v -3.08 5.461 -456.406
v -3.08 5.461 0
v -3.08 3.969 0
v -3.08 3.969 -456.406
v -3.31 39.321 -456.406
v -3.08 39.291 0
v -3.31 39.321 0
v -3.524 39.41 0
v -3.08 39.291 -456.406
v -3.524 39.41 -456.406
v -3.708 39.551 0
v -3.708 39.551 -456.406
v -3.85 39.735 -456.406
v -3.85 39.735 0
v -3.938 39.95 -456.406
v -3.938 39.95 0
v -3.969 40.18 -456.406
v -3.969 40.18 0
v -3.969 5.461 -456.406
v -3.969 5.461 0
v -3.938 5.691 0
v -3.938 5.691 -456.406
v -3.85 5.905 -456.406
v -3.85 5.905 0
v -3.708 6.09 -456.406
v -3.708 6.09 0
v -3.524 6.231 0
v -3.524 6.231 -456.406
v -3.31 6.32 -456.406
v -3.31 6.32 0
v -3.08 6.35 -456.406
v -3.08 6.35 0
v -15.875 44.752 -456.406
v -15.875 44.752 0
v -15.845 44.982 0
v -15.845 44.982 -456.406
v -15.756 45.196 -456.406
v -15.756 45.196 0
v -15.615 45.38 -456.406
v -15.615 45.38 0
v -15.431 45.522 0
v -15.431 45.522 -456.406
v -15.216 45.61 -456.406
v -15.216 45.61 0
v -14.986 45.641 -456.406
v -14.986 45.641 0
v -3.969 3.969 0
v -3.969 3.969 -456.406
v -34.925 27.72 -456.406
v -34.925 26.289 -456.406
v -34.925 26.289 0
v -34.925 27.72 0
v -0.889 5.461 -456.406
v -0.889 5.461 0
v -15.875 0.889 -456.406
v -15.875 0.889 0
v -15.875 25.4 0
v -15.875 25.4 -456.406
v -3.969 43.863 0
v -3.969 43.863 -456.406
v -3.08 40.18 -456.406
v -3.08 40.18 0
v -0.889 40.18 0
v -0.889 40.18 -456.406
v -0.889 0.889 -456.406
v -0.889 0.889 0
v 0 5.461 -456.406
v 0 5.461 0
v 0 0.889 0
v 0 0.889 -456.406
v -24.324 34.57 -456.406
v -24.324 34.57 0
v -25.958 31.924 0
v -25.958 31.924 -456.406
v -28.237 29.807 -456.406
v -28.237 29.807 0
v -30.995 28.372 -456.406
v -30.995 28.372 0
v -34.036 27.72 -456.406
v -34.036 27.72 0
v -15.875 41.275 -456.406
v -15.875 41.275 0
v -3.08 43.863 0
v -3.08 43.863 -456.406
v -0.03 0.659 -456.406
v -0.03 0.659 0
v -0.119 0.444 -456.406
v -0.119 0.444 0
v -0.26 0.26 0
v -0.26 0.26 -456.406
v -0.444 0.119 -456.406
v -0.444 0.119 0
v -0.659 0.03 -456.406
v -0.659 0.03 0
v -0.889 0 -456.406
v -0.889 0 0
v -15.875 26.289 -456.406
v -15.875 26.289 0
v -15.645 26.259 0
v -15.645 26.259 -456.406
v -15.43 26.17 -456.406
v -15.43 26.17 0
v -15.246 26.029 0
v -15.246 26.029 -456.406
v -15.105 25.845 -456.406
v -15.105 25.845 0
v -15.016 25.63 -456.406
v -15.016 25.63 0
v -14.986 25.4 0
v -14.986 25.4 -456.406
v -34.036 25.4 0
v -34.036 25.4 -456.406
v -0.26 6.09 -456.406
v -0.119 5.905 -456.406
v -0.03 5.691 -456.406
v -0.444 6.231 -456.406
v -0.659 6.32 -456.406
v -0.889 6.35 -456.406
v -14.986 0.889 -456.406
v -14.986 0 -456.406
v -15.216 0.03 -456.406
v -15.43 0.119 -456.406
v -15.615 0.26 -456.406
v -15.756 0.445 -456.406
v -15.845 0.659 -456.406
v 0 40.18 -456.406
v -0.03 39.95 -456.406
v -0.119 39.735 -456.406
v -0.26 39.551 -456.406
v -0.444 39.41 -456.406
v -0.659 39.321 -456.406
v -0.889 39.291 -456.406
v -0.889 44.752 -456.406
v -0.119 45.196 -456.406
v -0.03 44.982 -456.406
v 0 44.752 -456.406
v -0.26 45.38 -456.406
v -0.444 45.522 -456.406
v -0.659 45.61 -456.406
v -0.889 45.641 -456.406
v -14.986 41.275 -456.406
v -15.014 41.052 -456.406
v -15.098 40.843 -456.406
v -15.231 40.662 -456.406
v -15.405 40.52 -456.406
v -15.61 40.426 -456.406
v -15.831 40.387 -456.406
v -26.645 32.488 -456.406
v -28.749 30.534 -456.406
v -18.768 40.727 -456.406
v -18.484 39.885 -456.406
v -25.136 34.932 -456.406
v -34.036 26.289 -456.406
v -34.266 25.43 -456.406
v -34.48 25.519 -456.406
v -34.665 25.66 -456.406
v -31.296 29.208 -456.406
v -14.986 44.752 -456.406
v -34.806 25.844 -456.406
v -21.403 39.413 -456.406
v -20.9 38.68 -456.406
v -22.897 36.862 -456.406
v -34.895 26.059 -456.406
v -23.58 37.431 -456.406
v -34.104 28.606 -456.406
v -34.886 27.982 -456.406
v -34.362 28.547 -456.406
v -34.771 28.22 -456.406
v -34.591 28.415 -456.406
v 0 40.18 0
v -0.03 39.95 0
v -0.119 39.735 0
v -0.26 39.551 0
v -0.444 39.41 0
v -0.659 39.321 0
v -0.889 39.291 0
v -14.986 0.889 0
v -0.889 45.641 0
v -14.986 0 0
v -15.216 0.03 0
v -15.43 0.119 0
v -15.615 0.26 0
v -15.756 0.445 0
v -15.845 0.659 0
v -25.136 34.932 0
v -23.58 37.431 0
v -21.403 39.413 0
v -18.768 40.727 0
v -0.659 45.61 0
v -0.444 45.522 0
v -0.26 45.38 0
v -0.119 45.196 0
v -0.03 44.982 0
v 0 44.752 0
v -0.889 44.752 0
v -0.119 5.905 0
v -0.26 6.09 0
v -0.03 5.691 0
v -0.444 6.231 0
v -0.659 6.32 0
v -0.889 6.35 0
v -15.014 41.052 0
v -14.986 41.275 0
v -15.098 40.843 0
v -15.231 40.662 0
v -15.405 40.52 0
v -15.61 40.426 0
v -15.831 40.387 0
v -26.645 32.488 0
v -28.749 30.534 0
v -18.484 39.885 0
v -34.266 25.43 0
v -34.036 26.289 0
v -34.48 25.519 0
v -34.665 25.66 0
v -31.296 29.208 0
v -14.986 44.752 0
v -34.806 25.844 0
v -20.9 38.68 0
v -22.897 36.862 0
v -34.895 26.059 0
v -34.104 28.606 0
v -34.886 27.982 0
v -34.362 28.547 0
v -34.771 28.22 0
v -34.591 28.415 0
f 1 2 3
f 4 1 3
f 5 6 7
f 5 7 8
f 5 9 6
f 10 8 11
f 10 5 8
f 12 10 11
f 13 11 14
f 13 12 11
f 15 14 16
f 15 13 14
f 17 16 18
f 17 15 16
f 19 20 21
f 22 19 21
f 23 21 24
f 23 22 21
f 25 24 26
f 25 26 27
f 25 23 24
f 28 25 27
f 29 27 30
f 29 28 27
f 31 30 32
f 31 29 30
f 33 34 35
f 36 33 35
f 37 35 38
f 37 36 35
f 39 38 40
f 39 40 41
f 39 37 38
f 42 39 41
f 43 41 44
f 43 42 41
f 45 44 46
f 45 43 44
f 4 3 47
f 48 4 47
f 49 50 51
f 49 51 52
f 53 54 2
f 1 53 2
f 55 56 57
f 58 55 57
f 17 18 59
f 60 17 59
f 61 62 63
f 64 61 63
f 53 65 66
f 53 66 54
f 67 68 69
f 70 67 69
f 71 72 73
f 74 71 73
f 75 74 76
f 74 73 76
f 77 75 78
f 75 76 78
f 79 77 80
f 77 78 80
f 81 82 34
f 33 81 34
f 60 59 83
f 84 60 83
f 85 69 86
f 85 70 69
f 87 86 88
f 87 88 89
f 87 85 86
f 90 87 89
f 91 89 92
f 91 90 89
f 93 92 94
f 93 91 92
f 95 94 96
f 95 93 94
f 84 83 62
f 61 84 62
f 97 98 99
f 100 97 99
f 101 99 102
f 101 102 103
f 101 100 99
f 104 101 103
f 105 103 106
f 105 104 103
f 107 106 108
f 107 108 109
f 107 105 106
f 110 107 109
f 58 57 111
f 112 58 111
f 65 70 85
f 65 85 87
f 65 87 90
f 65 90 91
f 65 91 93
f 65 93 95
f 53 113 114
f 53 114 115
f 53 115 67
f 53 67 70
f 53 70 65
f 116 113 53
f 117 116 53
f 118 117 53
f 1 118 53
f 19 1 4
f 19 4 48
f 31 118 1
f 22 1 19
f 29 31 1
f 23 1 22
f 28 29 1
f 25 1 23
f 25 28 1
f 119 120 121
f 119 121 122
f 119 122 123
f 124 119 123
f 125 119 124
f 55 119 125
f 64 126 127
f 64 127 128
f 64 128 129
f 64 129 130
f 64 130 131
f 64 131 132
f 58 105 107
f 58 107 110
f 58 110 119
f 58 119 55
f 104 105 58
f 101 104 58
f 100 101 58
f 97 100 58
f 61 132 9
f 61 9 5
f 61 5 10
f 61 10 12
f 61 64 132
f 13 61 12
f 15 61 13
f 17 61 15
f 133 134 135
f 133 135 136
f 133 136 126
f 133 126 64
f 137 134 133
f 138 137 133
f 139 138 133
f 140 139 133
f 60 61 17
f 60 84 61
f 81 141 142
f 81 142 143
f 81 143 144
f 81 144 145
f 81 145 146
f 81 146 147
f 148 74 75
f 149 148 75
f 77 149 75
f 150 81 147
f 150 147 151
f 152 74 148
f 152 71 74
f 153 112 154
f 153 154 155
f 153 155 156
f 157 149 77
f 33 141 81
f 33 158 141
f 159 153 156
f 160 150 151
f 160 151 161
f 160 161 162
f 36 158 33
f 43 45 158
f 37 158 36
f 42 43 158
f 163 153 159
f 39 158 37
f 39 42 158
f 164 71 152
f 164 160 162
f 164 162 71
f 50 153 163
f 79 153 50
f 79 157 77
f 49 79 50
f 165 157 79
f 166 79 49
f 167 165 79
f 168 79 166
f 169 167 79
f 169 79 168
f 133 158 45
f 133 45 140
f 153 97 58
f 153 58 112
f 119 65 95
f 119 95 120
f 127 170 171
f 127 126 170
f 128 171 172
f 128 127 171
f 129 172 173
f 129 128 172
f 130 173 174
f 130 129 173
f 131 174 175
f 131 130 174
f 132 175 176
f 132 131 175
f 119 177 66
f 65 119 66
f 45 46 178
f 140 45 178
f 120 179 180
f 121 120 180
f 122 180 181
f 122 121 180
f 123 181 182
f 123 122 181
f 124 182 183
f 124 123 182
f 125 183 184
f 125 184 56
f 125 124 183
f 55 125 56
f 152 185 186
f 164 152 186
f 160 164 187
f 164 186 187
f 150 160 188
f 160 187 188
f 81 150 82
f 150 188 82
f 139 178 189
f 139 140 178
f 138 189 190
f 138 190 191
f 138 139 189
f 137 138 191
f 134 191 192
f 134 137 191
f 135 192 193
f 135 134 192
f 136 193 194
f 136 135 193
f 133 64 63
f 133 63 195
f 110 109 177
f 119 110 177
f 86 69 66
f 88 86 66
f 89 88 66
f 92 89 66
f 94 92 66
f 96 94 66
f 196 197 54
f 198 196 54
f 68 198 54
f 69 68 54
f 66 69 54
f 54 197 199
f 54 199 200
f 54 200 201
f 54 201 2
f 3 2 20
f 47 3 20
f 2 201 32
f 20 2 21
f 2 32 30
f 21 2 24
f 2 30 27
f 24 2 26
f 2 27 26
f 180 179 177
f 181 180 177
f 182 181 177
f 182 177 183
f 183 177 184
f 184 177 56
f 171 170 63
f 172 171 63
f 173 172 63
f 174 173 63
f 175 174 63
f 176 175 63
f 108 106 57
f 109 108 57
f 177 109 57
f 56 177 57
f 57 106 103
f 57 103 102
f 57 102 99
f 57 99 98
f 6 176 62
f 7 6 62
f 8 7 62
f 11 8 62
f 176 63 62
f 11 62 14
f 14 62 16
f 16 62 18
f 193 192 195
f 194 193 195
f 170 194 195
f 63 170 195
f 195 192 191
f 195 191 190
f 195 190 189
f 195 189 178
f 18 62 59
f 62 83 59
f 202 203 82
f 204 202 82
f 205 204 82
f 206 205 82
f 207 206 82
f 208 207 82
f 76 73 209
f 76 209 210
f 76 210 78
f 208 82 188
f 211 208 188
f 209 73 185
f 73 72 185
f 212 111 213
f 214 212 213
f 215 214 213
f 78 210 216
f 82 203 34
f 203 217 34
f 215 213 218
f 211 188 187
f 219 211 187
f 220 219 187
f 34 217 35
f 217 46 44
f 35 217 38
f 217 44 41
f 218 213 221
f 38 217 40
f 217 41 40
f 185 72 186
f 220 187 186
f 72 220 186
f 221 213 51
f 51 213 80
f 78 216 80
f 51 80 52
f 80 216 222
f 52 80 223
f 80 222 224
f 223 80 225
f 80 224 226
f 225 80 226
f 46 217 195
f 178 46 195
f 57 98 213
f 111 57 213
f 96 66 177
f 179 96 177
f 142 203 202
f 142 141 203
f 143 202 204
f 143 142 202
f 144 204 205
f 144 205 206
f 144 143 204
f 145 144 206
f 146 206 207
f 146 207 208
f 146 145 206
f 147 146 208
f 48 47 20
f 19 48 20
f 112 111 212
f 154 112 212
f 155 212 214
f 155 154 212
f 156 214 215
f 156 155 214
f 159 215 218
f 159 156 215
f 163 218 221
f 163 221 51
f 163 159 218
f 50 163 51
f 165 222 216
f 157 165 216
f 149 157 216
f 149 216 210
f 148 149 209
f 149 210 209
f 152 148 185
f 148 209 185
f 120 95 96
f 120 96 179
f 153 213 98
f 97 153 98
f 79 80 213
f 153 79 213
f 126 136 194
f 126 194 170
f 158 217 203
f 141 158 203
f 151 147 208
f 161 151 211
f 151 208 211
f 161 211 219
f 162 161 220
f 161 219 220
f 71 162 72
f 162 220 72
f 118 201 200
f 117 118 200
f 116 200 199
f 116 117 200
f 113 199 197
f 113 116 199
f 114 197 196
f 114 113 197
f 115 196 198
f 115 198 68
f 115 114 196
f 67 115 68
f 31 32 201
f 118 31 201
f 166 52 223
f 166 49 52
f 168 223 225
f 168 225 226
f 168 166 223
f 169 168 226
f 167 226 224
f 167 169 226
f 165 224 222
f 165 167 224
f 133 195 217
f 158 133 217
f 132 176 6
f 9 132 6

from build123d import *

# Parameters (mm, degrees)
EXTRUDE_THIN1_DEPTH = 456.40625
FILLET1_R           = 0.889


with BuildPart() as part:
    # Sketch1 → Extrude-Thin1 (new body)
    with BuildSketch(Plane.XY):
        with BuildLine():
            Line((-3.96875, 3.96875), (-3.96875, 6.35))
            Line((-3.96875, 6.35), (0, 6.35))
            Line((0, 6.35), (0, 0))
            Line((0, 0), (-15.875, 0))
            Line((-15.875, 0), (-15.875, 25.4))
            Line((-15.875, 25.4), (-34.925, 25.4))
            Line((-34.925, 25.4), (-34.925, 28.575))
            ThreePointArc((-34.925, 28.575), (-29.089166411, 30.303541744), (-25.13609411, 34.931503458))
            ThreePointArc((-25.13609411, 34.931503458), (-21.402652939, 39.412968218), (-15.875, 41.275))
            Line((-15.875, 41.275), (-15.875, 45.640625))
            Line((-15.875, 45.640625), (0, 45.640625))
            Line((0, 45.640625), (0, 39.290625))
            Line((0, 39.290625), (-3.96875, 39.290625))
            Line((-3.96875, 39.290625), (-3.96875, 43.862625))
            Line((-3.96875, 43.862625), (-3.07975, 43.862625))
            Line((-3.07975, 43.862625), (-3.07975, 40.179625))
            Line((-3.07975, 40.179625), (-0.889, 40.179625))
            Line((-0.889, 40.179625), (-0.889, 44.751625))
            Line((-0.889, 44.751625), (-14.986, 44.751625))
            Line((-14.986, 44.751625), (-14.986, 40.39236674))
            ThreePointArc((-14.986, 40.39236674), (-20.546471616, 38.910847666), (-24.323977473, 34.569857819))
            ThreePointArc((-24.323977473, 34.569857819), (-28.236581443, 29.80735665), (-34.036, 27.720102091))
            Line((-34.036, 27.720102091), (-34.036, 26.289))
            Line((-34.036, 26.289), (-14.986, 26.289))
            Line((-14.986, 26.289), (-14.986, 0.889))
            Line((-14.986, 0.889), (-0.889, 0.889))
            Line((-0.889, 0.889), (-0.889, 5.461))
            Line((-0.889, 5.461), (-3.07975, 5.461))
            Line((-3.07975, 5.461), (-3.07975, 3.96875))
            Line((-3.07975, 3.96875), (-3.96875, 3.96875))
        make_face()
    extrude(amount=-EXTRUDE_THIN1_DEPTH)

    # Fillet1
    fillet1_edges = [part.edges().sort_by_distance(p)[0] for p in [
        (-14.986, 40.39236674, -228.203125),
        (-14.986, 26.289, -228.203125),
        (-3.96875, 6.35, -228.203125),
        (0, 6.35, -228.203125),
        (0, 0, -228.203125),
        (-15.875, 0, -228.203125),
        (-34.925, 25.4, -228.203125),
        (-34.925, 28.575, -228.203125),
        (-15.875, 45.640625, -228.203125),
        (0, 45.640625, -228.203125),
        (0, 39.290625, -228.203125),
        (-3.96875, 39.290625, -228.203125),
    ]]
    fillet(fillet1_edges, radius=FILLET1_R)


solid = part.part
